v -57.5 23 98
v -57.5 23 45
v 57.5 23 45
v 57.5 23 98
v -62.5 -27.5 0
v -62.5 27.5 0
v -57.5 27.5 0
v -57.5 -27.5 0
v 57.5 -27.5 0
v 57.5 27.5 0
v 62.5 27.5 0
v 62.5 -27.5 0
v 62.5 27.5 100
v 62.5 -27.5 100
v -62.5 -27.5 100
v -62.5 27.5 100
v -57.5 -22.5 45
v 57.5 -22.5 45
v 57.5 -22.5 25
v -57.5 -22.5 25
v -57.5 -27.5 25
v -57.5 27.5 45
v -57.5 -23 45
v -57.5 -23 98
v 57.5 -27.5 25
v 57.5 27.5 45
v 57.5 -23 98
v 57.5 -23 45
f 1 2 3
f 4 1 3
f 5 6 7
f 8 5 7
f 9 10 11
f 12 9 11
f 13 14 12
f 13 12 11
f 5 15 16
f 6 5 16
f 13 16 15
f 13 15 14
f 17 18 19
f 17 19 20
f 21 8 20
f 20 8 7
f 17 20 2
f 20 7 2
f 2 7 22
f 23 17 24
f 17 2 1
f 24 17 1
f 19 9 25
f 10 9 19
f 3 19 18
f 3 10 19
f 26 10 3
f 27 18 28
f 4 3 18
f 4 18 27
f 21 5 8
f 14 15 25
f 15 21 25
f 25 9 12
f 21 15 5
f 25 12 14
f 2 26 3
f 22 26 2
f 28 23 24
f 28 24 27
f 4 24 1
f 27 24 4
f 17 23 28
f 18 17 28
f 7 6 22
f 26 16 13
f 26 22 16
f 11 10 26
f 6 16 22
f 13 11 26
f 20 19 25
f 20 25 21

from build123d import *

# Parameters (mm, degrees)
SKETCH008_W     = 125
SKETCH008_H     = 55
PAD008_DEPTH    = 100
SKETCH010_W     = 115
SKETCH010_H     = 25
POCKET_DEPTH    = 60
SKETCH011_W     = 115
SKETCH011_H     = 20
POCKET001_DEPTH = 50
SKETCH012_W     = 115
SKETCH012_H     = 46
POCKET002_DEPTH = 53


with BuildPart() as part:
    # Sketch008 → Pad008 (new body)
    with BuildSketch(Plane.XY):
        Rectangle(SKETCH008_W, SKETCH008_H)
    extrude(amount=PAD008_DEPTH)

    # Sketch010 → Pocket (cut)
    with BuildSketch(Plane(origin=(0, 27.5, 0), x_dir=(-1, 0, 0), z_dir=(0, 1, 0))):
        with Locations((0, 12.5)):
            Rectangle(SKETCH010_W, SKETCH010_H)
    extrude(amount=-POCKET_DEPTH, mode=Mode.SUBTRACT)

    # Sketch011 → Pocket001 (cut)
    with BuildSketch(Plane(origin=(0, 27.5, 0), x_dir=(-1, 0, 0), z_dir=(0, 1, 0))):
        with Locations((0, 35)):
            Rectangle(SKETCH011_W, SKETCH011_H)
    extrude(amount=-POCKET001_DEPTH, mode=Mode.SUBTRACT)

    # Sketch012 → Pocket002 (cut)
    with BuildSketch(Plane(origin=(0, 0, 45), x_dir=(1, 0, 0), z_dir=(0, 0, -1))):
        Rectangle(SKETCH012_W, SKETCH012_H)
    extrude(amount=-POCKET002_DEPTH, mode=Mode.SUBTRACT)


solid = part.part
